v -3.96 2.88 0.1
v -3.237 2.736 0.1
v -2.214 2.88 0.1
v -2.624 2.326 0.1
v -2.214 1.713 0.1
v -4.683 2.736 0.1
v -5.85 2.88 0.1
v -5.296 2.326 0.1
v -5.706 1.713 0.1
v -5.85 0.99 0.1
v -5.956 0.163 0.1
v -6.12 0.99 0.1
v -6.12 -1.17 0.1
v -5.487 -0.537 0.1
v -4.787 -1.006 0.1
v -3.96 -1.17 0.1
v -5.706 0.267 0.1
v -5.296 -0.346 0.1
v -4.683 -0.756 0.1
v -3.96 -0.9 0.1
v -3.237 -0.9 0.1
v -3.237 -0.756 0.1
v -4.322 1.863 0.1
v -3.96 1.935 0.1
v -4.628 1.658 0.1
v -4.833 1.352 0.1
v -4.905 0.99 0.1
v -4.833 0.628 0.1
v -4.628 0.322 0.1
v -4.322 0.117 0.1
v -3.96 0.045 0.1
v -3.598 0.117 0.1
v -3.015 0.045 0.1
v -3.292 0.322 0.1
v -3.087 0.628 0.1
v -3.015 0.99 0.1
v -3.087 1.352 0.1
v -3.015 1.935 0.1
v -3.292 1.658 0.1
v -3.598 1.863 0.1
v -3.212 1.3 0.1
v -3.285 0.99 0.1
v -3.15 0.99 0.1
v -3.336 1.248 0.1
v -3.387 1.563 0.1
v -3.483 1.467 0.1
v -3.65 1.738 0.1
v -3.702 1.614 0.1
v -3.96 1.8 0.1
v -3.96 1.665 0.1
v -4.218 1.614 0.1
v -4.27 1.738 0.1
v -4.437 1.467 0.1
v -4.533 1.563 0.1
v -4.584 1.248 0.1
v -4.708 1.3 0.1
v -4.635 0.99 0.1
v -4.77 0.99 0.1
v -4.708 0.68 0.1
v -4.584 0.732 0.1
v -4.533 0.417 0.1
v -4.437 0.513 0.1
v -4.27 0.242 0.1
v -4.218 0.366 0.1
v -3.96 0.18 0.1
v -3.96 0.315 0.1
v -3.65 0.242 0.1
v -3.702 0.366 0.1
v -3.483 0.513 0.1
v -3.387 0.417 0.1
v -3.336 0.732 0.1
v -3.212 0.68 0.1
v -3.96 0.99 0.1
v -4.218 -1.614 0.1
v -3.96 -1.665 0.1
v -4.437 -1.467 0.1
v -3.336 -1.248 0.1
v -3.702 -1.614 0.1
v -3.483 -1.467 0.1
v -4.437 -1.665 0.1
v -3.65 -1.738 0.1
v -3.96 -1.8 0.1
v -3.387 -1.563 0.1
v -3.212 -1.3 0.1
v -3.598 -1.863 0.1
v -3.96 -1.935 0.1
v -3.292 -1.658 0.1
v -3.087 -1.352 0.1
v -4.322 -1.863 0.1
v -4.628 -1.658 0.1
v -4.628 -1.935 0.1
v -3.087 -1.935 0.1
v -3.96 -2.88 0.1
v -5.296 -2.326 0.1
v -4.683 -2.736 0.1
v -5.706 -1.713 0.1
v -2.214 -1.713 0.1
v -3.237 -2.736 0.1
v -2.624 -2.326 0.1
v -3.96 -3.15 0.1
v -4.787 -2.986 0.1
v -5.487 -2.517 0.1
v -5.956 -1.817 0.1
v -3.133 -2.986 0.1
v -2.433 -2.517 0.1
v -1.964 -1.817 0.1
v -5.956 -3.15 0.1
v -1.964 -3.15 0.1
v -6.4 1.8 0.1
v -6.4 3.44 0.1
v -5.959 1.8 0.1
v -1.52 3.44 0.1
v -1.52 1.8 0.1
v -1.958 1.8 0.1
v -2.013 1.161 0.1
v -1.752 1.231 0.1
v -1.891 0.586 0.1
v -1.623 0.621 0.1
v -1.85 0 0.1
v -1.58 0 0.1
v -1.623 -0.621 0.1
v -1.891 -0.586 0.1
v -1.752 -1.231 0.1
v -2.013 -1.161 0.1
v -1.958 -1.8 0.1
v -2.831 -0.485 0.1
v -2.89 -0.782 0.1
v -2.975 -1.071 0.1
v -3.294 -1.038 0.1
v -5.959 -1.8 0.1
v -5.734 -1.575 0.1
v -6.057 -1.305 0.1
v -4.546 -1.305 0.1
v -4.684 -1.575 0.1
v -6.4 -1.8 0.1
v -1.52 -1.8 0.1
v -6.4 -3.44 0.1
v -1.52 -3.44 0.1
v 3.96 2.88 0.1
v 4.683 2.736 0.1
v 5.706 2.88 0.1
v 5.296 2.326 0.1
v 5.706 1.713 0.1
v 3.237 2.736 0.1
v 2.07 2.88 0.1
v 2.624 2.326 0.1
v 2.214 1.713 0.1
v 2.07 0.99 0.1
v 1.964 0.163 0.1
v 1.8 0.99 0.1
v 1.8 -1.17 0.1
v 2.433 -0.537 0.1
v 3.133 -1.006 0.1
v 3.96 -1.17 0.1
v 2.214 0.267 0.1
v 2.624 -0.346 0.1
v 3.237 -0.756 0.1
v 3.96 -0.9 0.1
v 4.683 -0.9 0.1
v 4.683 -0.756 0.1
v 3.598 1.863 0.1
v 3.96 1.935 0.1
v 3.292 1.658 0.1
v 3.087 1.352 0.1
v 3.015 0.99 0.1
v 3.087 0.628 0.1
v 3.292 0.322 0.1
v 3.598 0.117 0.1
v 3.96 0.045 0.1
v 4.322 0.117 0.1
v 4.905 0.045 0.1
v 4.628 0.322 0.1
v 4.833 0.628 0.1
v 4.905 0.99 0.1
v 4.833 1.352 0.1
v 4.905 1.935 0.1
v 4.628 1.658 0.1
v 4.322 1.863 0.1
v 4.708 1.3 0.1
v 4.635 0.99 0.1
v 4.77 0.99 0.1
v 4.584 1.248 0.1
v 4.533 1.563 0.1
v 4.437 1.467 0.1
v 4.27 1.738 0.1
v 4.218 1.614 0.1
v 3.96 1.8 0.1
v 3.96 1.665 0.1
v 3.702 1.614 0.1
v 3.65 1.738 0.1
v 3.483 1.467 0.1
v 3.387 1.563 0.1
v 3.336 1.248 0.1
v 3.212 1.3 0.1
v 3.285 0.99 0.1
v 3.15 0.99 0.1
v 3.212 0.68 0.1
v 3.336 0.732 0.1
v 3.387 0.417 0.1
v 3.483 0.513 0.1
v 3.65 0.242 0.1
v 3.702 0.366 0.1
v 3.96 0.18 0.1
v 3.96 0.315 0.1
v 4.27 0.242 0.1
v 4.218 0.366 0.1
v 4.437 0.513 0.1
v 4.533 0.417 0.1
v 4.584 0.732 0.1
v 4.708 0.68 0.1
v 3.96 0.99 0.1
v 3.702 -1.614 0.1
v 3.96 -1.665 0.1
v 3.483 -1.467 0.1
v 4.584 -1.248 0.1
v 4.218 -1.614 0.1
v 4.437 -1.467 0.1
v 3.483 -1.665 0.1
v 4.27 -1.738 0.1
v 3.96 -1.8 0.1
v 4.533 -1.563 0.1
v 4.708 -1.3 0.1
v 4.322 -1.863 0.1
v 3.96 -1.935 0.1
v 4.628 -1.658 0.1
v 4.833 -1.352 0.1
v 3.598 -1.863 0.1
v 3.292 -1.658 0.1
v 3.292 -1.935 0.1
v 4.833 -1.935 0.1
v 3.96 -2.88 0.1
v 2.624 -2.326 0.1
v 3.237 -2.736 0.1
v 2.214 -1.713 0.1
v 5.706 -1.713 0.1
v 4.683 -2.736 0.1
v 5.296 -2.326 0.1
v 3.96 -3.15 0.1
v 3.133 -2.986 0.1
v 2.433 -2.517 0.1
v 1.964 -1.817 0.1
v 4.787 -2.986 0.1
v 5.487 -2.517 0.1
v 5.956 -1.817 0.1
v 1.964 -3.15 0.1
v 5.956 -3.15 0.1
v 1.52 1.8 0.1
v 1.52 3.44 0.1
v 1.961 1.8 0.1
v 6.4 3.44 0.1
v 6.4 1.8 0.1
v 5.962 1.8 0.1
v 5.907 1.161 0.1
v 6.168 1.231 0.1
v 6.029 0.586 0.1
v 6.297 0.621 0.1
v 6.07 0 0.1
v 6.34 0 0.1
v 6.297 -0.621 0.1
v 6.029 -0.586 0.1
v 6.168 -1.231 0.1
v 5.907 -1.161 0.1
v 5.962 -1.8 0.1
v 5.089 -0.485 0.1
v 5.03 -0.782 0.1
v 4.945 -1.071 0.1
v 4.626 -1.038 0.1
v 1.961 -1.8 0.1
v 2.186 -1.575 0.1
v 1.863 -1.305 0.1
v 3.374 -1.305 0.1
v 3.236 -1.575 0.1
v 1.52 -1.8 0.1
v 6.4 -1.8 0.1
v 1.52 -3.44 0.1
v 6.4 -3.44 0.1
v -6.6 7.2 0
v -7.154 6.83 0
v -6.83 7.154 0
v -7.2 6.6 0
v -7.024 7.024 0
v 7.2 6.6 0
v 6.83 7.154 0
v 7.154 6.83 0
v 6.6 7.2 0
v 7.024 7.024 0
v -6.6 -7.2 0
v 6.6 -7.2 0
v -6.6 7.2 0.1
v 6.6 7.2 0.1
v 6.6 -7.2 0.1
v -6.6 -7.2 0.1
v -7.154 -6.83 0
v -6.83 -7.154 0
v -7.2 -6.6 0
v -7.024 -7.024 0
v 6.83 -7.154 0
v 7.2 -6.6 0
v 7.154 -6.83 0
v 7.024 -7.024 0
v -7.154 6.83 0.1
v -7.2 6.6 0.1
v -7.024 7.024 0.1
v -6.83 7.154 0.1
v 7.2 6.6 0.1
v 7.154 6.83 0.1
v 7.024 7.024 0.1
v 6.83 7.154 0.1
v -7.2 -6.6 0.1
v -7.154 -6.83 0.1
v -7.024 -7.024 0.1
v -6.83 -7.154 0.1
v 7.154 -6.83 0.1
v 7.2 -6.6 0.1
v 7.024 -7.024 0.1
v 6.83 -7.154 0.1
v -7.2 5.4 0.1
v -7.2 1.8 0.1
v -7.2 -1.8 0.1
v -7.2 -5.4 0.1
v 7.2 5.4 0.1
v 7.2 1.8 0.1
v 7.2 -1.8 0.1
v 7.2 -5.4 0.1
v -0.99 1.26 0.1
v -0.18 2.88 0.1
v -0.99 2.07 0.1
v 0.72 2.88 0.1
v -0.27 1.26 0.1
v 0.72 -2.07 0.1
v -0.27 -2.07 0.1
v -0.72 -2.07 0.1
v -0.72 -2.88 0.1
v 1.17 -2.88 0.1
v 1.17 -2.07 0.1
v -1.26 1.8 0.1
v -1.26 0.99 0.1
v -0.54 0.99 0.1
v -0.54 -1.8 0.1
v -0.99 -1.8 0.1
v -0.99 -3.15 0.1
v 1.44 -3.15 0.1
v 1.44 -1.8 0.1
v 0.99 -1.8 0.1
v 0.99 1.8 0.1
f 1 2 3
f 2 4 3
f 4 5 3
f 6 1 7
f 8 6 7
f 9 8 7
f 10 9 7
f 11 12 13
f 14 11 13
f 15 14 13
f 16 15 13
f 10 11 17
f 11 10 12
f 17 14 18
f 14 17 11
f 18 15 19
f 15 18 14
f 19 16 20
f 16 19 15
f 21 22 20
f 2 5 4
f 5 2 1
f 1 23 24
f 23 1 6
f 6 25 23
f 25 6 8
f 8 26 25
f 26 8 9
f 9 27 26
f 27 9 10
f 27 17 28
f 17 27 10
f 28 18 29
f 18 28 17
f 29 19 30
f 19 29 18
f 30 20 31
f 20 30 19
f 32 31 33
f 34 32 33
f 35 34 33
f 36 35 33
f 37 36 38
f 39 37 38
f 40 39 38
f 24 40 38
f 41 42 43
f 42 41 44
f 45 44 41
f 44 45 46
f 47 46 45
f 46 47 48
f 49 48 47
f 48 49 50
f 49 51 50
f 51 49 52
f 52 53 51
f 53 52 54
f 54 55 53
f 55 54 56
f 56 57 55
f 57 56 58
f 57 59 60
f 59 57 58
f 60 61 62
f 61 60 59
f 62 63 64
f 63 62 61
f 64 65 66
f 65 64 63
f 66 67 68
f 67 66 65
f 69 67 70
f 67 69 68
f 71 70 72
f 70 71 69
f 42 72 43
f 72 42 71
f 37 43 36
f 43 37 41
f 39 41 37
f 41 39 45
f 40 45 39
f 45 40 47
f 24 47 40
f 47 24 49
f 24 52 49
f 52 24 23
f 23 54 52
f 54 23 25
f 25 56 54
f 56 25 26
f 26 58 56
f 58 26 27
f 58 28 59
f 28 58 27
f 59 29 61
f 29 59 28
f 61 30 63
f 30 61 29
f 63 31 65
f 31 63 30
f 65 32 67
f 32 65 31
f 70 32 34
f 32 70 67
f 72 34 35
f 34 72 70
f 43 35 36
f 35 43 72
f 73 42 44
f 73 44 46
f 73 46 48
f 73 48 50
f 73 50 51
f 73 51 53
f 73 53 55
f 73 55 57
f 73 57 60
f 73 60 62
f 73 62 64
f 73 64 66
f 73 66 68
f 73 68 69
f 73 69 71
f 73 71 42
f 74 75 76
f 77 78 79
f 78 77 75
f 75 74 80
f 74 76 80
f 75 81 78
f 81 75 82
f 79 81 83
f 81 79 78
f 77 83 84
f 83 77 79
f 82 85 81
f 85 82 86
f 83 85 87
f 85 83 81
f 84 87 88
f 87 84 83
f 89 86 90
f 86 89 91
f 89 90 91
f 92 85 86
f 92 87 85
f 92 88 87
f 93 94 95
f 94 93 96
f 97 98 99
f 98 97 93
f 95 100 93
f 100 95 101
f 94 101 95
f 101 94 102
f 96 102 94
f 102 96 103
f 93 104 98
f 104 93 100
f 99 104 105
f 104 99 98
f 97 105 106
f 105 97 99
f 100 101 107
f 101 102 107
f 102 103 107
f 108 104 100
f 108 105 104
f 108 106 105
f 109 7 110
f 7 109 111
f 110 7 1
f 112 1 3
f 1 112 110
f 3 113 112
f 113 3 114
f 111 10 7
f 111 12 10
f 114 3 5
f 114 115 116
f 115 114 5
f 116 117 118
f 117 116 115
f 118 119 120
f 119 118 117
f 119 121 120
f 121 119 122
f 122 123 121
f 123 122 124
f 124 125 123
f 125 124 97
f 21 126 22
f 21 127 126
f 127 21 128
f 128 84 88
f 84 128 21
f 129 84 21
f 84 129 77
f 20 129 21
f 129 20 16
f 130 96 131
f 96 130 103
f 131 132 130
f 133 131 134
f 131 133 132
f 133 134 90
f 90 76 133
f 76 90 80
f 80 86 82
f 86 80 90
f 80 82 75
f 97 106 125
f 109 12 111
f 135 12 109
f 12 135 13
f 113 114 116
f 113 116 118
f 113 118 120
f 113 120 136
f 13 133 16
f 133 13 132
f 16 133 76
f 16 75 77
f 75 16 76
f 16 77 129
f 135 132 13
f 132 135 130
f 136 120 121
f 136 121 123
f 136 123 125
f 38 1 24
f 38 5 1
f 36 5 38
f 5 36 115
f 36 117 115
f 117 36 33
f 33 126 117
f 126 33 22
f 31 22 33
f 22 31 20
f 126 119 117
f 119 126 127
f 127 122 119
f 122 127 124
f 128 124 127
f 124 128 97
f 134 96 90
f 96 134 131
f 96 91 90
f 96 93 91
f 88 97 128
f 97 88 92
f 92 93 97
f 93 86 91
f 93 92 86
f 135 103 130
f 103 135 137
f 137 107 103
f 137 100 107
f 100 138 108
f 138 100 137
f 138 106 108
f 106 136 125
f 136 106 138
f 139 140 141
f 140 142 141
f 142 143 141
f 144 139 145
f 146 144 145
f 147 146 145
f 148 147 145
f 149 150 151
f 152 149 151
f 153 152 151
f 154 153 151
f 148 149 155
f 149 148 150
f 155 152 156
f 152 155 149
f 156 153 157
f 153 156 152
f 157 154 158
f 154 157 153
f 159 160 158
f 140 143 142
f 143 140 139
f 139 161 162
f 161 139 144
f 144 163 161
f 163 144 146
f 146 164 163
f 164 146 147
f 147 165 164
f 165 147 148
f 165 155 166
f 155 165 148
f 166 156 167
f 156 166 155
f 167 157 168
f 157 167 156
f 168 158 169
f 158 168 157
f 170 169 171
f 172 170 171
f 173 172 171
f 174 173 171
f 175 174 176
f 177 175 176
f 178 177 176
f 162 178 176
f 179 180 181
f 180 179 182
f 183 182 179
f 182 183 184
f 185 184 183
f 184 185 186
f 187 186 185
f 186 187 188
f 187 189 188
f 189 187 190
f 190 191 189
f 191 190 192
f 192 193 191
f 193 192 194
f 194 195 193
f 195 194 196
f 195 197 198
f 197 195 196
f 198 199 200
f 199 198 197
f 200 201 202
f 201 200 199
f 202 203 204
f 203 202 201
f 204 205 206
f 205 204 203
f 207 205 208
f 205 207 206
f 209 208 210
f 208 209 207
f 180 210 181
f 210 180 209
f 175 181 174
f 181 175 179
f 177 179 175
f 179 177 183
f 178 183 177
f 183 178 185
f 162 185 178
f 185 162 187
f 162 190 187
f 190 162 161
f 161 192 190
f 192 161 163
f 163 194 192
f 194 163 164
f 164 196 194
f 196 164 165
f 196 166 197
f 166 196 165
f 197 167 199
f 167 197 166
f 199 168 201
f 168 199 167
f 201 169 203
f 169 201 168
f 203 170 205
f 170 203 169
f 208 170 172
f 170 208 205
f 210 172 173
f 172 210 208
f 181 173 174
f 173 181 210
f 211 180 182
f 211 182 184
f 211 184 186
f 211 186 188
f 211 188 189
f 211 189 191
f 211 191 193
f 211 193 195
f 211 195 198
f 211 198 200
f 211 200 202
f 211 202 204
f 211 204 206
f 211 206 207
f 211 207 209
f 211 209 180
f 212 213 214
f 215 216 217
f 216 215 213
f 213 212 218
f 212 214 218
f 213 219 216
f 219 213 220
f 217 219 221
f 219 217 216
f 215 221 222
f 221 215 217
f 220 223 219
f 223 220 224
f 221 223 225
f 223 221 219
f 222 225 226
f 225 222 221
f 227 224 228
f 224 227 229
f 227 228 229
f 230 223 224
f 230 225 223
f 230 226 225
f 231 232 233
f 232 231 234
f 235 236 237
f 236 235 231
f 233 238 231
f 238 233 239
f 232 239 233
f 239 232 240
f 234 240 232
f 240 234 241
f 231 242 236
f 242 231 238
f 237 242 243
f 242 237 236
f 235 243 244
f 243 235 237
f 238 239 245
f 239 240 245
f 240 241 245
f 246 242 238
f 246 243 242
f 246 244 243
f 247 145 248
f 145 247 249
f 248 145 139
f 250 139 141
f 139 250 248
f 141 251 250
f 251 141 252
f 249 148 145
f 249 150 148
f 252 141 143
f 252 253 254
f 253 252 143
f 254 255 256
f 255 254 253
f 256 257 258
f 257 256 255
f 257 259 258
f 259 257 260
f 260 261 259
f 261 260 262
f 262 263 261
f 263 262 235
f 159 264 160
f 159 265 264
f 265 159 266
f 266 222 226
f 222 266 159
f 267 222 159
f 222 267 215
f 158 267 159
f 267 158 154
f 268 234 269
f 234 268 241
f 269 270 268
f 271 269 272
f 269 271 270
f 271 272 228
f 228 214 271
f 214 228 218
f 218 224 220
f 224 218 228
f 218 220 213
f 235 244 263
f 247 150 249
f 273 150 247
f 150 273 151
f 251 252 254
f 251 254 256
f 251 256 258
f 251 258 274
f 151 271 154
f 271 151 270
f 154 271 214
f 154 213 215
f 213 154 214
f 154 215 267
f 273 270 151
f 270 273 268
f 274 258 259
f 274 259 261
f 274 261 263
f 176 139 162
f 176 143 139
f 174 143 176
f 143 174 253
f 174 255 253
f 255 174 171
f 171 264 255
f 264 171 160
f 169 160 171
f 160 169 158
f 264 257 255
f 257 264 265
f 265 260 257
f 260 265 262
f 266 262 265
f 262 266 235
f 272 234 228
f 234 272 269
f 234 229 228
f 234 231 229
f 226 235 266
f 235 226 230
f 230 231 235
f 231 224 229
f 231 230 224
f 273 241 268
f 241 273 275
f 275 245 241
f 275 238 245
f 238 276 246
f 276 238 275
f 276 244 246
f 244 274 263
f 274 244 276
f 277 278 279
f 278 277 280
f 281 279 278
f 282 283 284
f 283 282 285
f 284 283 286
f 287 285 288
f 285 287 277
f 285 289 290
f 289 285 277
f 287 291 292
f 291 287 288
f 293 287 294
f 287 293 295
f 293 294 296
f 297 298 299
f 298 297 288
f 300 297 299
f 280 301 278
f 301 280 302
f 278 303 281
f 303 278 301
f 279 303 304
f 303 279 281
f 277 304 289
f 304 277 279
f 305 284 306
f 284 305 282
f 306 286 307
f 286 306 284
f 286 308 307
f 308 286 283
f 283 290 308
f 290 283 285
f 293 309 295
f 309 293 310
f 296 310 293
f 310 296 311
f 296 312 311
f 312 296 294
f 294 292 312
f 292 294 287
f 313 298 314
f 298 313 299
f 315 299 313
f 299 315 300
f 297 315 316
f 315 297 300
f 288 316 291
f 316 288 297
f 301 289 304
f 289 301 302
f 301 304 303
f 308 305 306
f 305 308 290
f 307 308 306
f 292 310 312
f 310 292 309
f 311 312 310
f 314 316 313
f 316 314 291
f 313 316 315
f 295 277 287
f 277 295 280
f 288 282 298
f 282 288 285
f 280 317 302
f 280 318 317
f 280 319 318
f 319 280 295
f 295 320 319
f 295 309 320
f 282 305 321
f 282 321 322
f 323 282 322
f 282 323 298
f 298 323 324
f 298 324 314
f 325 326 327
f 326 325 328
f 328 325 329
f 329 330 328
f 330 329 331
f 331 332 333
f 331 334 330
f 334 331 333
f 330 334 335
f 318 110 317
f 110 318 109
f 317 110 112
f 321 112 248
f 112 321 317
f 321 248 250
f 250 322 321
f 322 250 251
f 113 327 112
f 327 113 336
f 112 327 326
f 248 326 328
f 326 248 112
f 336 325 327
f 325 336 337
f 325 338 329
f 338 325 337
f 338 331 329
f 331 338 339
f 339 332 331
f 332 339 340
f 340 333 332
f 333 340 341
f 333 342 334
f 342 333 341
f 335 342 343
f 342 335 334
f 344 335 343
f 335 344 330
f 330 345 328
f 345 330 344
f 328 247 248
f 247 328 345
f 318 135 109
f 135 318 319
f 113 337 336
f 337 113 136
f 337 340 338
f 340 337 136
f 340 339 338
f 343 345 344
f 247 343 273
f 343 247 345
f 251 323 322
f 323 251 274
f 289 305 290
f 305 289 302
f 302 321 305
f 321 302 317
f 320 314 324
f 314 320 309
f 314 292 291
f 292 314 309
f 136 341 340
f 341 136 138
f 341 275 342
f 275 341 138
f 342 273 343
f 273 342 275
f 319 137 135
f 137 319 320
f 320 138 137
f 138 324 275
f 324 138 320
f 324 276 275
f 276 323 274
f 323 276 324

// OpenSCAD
use <../lib.scad>
use <../p/1-4chrd.scad>
use <../p/1-4cyli.scad>
use <../p/box3u12.scad>
use <s/6148328ns01.scad>
function ldraw_lib__6148328n() = [
// 0 Sticker  1.8 x  1.8 with White "919" on German Flag on White Background
// 0 Name: 6148328n.dat
// 0 Author: Massimo Maso [Sirio]
// 0 !LDRAW_ORG Part UPDATE 2024-05
// 0 !LICENSE Licensed under CC BY 4.0 : see CAreadme.txt
// 
// 0 BFC CERTIFY CCW
  [0,"BFC","CERTIFY"],
  [0,"BFC","CCW"],
// 
// 0 !KEYWORDS 917K, Bricklink 75876stk01, Brickowl 852010, Hybrid, Pit Lane
// 0 !KEYWORDS Porsche, Rebrickable 26357, set 75876, Speed Champions
// 
// 0 !HISTORY 2024-06-30 [OrionP] Official Update 2024-05
// 
// 
// 0 // Subparts
// 
// 1 16 -9.9 -.25 0 1 0 0 0 1 0 0 0 1 s\6148328ns01.dat
  [1,16,-9.9,-.25,0,1,0,0,0,1,0,0,0,1, ldraw_lib__s__6148328ns01()],
// 1 16 9.9 -.25 0 1 0 0 0 1 0 0 0 1 s\6148328ns01.dat
  [1,16,9.9,-.25,0,1,0,0,0,1,0,0,0,1, ldraw_lib__s__6148328ns01()],
// 0 // Primitives
// 1 16 -16.5 0 16.5 -1.5 0 0 0 -1 0 0 0 1.5 1-4chrd.dat
  [1,16,-16.5,0,16.5,-1.5,0,0,0,-1,0,0,0,1.5, ldraw_lib__1_4chrd()],
// 1 16 16.5 0 16.5 1.5 0 0 0 -1 0 0 0 1.5 1-4chrd.dat
  [1,16,16.5,0,16.5,1.5,0,0,0,-1,0,0,0,1.5, ldraw_lib__1_4chrd()],
// 1 16 0 -.25 0 16.5 0 0 0 .25 0 0 0 18 box3u12.dat
  [1,16,0,-.25,0,16.5,0,0,0,.25,0,0,0,18, ldraw_lib__box3u12()],
// 1 16 -16.5 0 -16.5 -1.5 0 0 0 -1 0 0 0 -1.5 1-4chrd.dat
  [1,16,-16.5,0,-16.5,-1.5,0,0,0,-1,0,0,0,-1.5, ldraw_lib__1_4chrd()],
// 1 16 16.5 0 -16.5 1.5 0 0 0 -1 0 0 0 -1.5 1-4chrd.dat
  [1,16,16.5,0,-16.5,1.5,0,0,0,-1,0,0,0,-1.5, ldraw_lib__1_4chrd()],
// 1 16 -16.5 0 16.5 -1.5 0 0 0 -.25 0 0 0 1.5 1-4cyli.dat
  [1,16,-16.5,0,16.5,-1.5,0,0,0,-.25,0,0,0,1.5, ldraw_lib__1_4cyli()],
// 1 16 16.5 0 16.5 1.5 0 0 0 -.25 0 0 0 1.5 1-4cyli.dat
  [1,16,16.5,0,16.5,1.5,0,0,0,-.25,0,0,0,1.5, ldraw_lib__1_4cyli()],
// 1 16 -16.5 0 -16.5 -1.5 0 0 0 -.25 0 0 0 -1.5 1-4cyli.dat
  [1,16,-16.5,0,-16.5,-1.5,0,0,0,-.25,0,0,0,-1.5, ldraw_lib__1_4cyli()],
// 1 16 16.5 0 -16.5 1.5 0 0 0 -.25 0 0 0 -1.5 1-4cyli.dat
  [1,16,16.5,0,-16.5,1.5,0,0,0,-.25,0,0,0,-1.5, ldraw_lib__1_4cyli()],
// 1 15 -16.5 -.25 16.5 -1.5 0 0 0 1 0 0 0 1.5 1-4chrd.dat
  [1,15,-16.5,-.25,16.5,-1.5,0,0,0,1,0,0,0,1.5, ldraw_lib__1_4chrd()],
// 1 15 16.5 -.25 16.5 1.5 0 0 0 1 0 0 0 1.5 1-4chrd.dat
  [1,15,16.5,-.25,16.5,1.5,0,0,0,1,0,0,0,1.5, ldraw_lib__1_4chrd()],
// 1 15 -16.5 -.25 -16.5 -1.5 0 0 0 1 0 0 0 -1.5 1-4chrd.dat
  [1,15,-16.5,-.25,-16.5,-1.5,0,0,0,1,0,0,0,-1.5, ldraw_lib__1_4chrd()],
// 1 15 16.5 -.25 -16.5 1.5 0 0 0 1 0 0 0 -1.5 1-4chrd.dat
  [1,15,16.5,-.25,-16.5,1.5,0,0,0,1,0,0,0,-1.5, ldraw_lib__1_4chrd()],
// 0 // Bottom faces
// 4 16 -16.5 0 18 -16.5 0 -18 -18 0 -16.5 -18 0 16.5
  [4,16,-16.5,0,18,-16.5,0,-18,-18,0,-16.5,-18,0,16.5],
// 4 16 16.5 0 18 18 0 16.5 18 0 -16.5 16.5 0 -18
  [4,16,16.5,0,18,18,0,16.5,18,0,-16.5,16.5,0,-18],
// 0 // Lateral faces
// 3 16 -18 0 16.5 -18 -.25 13.5 -18 -.25 16.5
  [3,16,-18,0,16.5,-18,-.25,13.5,-18,-.25,16.5],
// 3 16 -18 0 16.5 -18 -.25 4.5 -18 -.25 13.5
  [3,16,-18,0,16.5,-18,-.25,4.5,-18,-.25,13.5],
// 4 16 -18 0 16.5 -18 0 -16.5 -18 -.25 -4.5 -18 -.25 4.5
  [4,16,-18,0,16.5,-18,0,-16.5,-18,-.25,-4.5,-18,-.25,4.5],
// 3 16 -18 0 -16.5 -18 -.25 -13.5 -18 -.25 -4.5
  [3,16,-18,0,-16.5,-18,-.25,-13.5,-18,-.25,-4.5],
// 3 16 -18 0 -16.5 -18 -.25 -16.5 -18 -.25 -13.5
  [3,16,-18,0,-16.5,-18,-.25,-16.5,-18,-.25,-13.5],
// 3 16 18 0 16.5 18 -.25 16.5 18 -.25 13.5
  [3,16,18,0,16.5,18,-.25,16.5,18,-.25,13.5],
// 3 16 18 0 16.5 18 -.25 13.5 18 -.25 4.5
  [3,16,18,0,16.5,18,-.25,13.5,18,-.25,4.5],
// 4 16 18 0 16.5 18 -.25 4.5 18 -.25 -4.5 18 0 -16.5
  [4,16,18,0,16.5,18,-.25,4.5,18,-.25,-4.5,18,0,-16.5],
// 3 16 18 0 -16.5 18 -.25 -4.5 18 -.25 -13.5
  [3,16,18,0,-16.5,18,-.25,-4.5,18,-.25,-13.5],
// 3 16 18 0 -16.5 18 -.25 -13.5 18 -.25 -16.5
  [3,16,18,0,-16.5,18,-.25,-13.5,18,-.25,-16.5],
// 0 // Top faces
// 0 // Inner of number "1"
// 4 15 1.8 -.25 7.2 -.45 -.25 7.2 -2.475 -.25 5.175 -2.475 -.25 3.15
  [4,15,1.8,-.25,7.2,-.45,-.25,7.2,-2.475,-.25,5.175,-2.475,-.25,3.15],
// 3 15 1.8 -.25 7.2 -2.475 -.25 3.15 -.675 -.25 3.15
  [3,15,1.8,-.25,7.2,-2.475,-.25,3.15,-.675,-.25,3.15],
// 4 15 1.8 -.25 7.2 -.675 -.25 3.15 -.675 -.25 -5.175 1.8 -.25 -5.175
  [4,15,1.8,-.25,7.2,-.675,-.25,3.15,-.675,-.25,-5.175,1.8,-.25,-5.175],
// 3 15 -.675 -.25 -5.175 -1.8 -.25 -5.175 -1.8 -.25 -7.2
  [3,15,-.675,-.25,-5.175,-1.8,-.25,-5.175,-1.8,-.25,-7.2],
// 4 15 -.675 -.25 -5.175 -1.8 -.25 -7.2 2.925 -.25 -7.2 1.8 -.25 -5.175
  [4,15,-.675,-.25,-5.175,-1.8,-.25,-7.2,2.925,-.25,-7.2,1.8,-.25,-5.175],
// 3 15 1.8 -.25 -5.175 2.925 -.25 -7.2 2.925 -.25 -5.175
  [3,15,1.8,-.25,-5.175,2.925,-.25,-7.2,2.925,-.25,-5.175],
// 0 // Black faces
// 4 0 -18 -.25 13.5 -18 -.25 4.5 -16 -.25 4.5 -16 -.25 8.6
  [4,0,-18,-.25,13.5,-18,-.25,4.5,-16,-.25,4.5,-16,-.25,8.6],
// 3 0 -18 -.25 13.5 -16 -.25 8.6 -3.8 -.25 8.6
  [3,0,-18,-.25,13.5,-16,-.25,8.6,-3.8,-.25,8.6],
// 4 0 -18 -.25 13.5 -3.8 -.25 8.6 3.8 -.25 8.6 18 -.25 13.5
  [4,0,-18,-.25,13.5,-3.8,-.25,8.6,3.8,-.25,8.6,18,-.25,13.5],
// 3 0 18 -.25 13.5 3.8 -.25 8.6 16 -.25 8.6
  [3,0,18,-.25,13.5,3.8,-.25,8.6,16,-.25,8.6],
// 4 0 18 -.25 13.5 16 -.25 8.6 16 -.25 4.5 18 -.25 4.5
  [4,0,18,-.25,13.5,16,-.25,8.6,16,-.25,4.5,18,-.25,4.5],
// 4 0 -3.8 -.25 8.6 -3.8 -.25 4.5 -3.15 -.25 4.5 -2.475 -.25 5.175
  [4,0,-3.8,-.25,8.6,-3.8,-.25,4.5,-3.15,-.25,4.5,-2.475,-.25,5.175],
// 3 0 -3.8 -.25 8.6 -2.475 -.25 5.175 -.45 -.25 7.2
  [3,0,-3.8,-.25,8.6,-2.475,-.25,5.175,-.45,-.25,7.2],
// 4 0 -3.8 -.25 8.6 -.45 -.25 7.2 1.8 -.25 7.2 3.8 -.25 8.6
  [4,0,-3.8,-.25,8.6,-.45,-.25,7.2,1.8,-.25,7.2,3.8,-.25,8.6],
// 4 0 -3.15 -.25 2.475 -2.475 -.25 3.15 -2.475 -.25 5.175 -3.15 -.25 4.5
  [4,0,-3.15,-.25,2.475,-2.475,-.25,3.15,-2.475,-.25,5.175,-3.15,-.25,4.5],
// 4 0 -3.15 -.25 2.475 -1.35 -.25 2.475 -.675 -.25 3.15 -2.475 -.25 3.15
  [4,0,-3.15,-.25,2.475,-1.35,-.25,2.475,-.675,-.25,3.15,-2.475,-.25,3.15],
// 4 0 -1.35 -.25 -4.5 -.675 -.25 -5.175 -.675 -.25 3.15 -1.35 -.25 2.475
  [4,0,-1.35,-.25,-4.5,-.675,-.25,-5.175,-.675,-.25,3.15,-1.35,-.25,2.475],
// 4 0 -1.35 -.25 -4.5 -2.475 -.25 -4.5 -1.8 -.25 -5.175 -.675 -.25 -5.175
  [4,0,-1.35,-.25,-4.5,-2.475,-.25,-4.5,-1.8,-.25,-5.175,-.675,-.25,-5.175],
// 4 0 -2.475 -.25 -7.875 -1.8 -.25 -7.2 -1.8 -.25 -5.175 -2.475 -.25 -4.5
  [4,0,-2.475,-.25,-7.875,-1.8,-.25,-7.2,-1.8,-.25,-5.175,-2.475,-.25,-4.5],
// 4 0 -2.475 -.25 -7.875 3.6 -.25 -7.875 2.925 -.25 -7.2 -1.8 -.25 -7.2
  [4,0,-2.475,-.25,-7.875,3.6,-.25,-7.875,2.925,-.25,-7.2,-1.8,-.25,-7.2],
// 4 0 3.6 -.25 -4.5 2.925 -.25 -5.175 2.925 -.25 -7.2 3.6 -.25 -7.875
  [4,0,3.6,-.25,-4.5,2.925,-.25,-5.175,2.925,-.25,-7.2,3.6,-.25,-7.875],
// 4 0 3.6 -.25 -4.5 2.475 -.25 -4.5 1.8 -.25 -5.175 2.925 -.25 -5.175
  [4,0,3.6,-.25,-4.5,2.475,-.25,-4.5,1.8,-.25,-5.175,2.925,-.25,-5.175],
// 4 0 2.475 -.25 4.5 1.8 -.25 7.2 1.8 -.25 -5.175 2.475 -.25 -4.5
  [4,0,2.475,-.25,4.5,1.8,-.25,7.2,1.8,-.25,-5.175,2.475,-.25,-4.5],
// 4 0 2.475 -.25 4.5 3.8 -.25 4.5 3.8 -.25 8.6 1.8 -.25 7.2
  [4,0,2.475,-.25,4.5,3.8,-.25,4.5,3.8,-.25,8.6,1.8,-.25,7.2],
// 0 // Red faces
// 4 4 -18 -.25 -4.5 -16 -.25 -4.5 -16 -.25 4.5 -18 -.25 4.5
  [4,4,-18,-.25,-4.5,-16,-.25,-4.5,-16,-.25,4.5,-18,-.25,4.5],
// 4 4 -3.8 -.25 -4.5 -3.15 -.25 2.475 -3.15 -.25 4.5 -3.8 -.25 4.5
  [4,4,-3.8,-.25,-4.5,-3.15,-.25,2.475,-3.15,-.25,4.5,-3.8,-.25,4.5],
// 4 4 -3.8 -.25 -4.5 -2.475 -.25 -4.5 -1.35 -.25 2.475 -3.15 -.25 2.475
  [4,4,-3.8,-.25,-4.5,-2.475,-.25,-4.5,-1.35,-.25,2.475,-3.15,-.25,2.475],
// 3 4 -2.475 -.25 -4.5 -1.35 -.25 -4.5 -1.35 -.25 2.475
  [3,4,-2.475,-.25,-4.5,-1.35,-.25,-4.5,-1.35,-.25,2.475],
// 3 4 3.6 -.25 -4.5 2.475 -.25 4.5 2.475 -.25 -4.5
  [3,4,3.6,-.25,-4.5,2.475,-.25,4.5,2.475,-.25,-4.5],
// 4 4 3.6 -.25 -4.5 3.8 -.25 -4.5 3.8 -.25 4.5 2.475 -.25 4.5
  [4,4,3.6,-.25,-4.5,3.8,-.25,-4.5,3.8,-.25,4.5,2.475,-.25,4.5],
// 4 4 18 -.25 -4.5 18 -.25 4.5 16 -.25 4.5 16 -.25 -4.5
  [4,4,18,-.25,-4.5,18,-.25,4.5,16,-.25,4.5,16,-.25,-4.5],
// 0 // White faces
// 4 15 -18 -.25 16.5 18 -.25 16.5 16.5 -.25 18 -16.5 -.25 18
  [4,15,-18,-.25,16.5,18,-.25,16.5,16.5,-.25,18,-16.5,-.25,18],
// 4 15 -18 -.25 16.5 -18 -.25 13.5 18 -.25 13.5 18 -.25 16.5
  [4,15,-18,-.25,16.5,-18,-.25,13.5,18,-.25,13.5,18,-.25,16.5],
// 4 15 -18 -.25 -16.5 18 -.25 -16.5 18 -.25 -13.5 -18 -.25 -13.5
  [4,15,-18,-.25,-16.5,18,-.25,-16.5,18,-.25,-13.5,-18,-.25,-13.5],
// 4 15 -18 -.25 -16.5 -16.5 -.25 -18 16.5 -.25 -18 18 -.25 -16.5
  [4,15,-18,-.25,-16.5,-16.5,-.25,-18,16.5,-.25,-18,18,-.25,-16.5],
// 0 // Yellow faces
// 4 14 -3.8 -.25 -8.6 -2.475 -.25 -7.875 -2.475 -.25 -4.5 -3.8 -.25 -4.5
  [4,14,-3.8,-.25,-8.6,-2.475,-.25,-7.875,-2.475,-.25,-4.5,-3.8,-.25,-4.5],
// 4 14 -3.8 -.25 -8.6 3.8 -.25 -8.6 3.6 -.25 -7.875 -2.475 -.25 -7.875
  [4,14,-3.8,-.25,-8.6,3.8,-.25,-8.6,3.6,-.25,-7.875,-2.475,-.25,-7.875],
// 4 14 3.8 -.25 -8.6 3.8 -.25 -4.5 3.6 -.25 -4.5 3.6 -.25 -7.875
  [4,14,3.8,-.25,-8.6,3.8,-.25,-4.5,3.6,-.25,-4.5,3.6,-.25,-7.875],
// 4 14 -18 -.25 -13.5 -16 -.25 -8.6 -16 -.25 -4.5 -18 -.25 -4.5
  [4,14,-18,-.25,-13.5,-16,-.25,-8.6,-16,-.25,-4.5,-18,-.25,-4.5],
// 3 14 -18 -.25 -13.5 -3.8 -.25 -8.6 -16 -.25 -8.6
  [3,14,-18,-.25,-13.5,-3.8,-.25,-8.6,-16,-.25,-8.6],
// 4 14 -18 -.25 -13.5 18 -.25 -13.5 3.8 -.25 -8.6 -3.8 -.25 -8.6
  [4,14,-18,-.25,-13.5,18,-.25,-13.5,3.8,-.25,-8.6,-3.8,-.25,-8.6],
// 3 14 18 -.25 -13.5 16 -.25 -8.6 3.8 -.25 -8.6
  [3,14,18,-.25,-13.5,16,-.25,-8.6,3.8,-.25,-8.6],
// 4 14 18 -.25 -13.5 18 -.25 -4.5 16 -.25 -4.5 16 -.25 -8.6
  [4,14,18,-.25,-13.5,18,-.25,-4.5,16,-.25,-4.5,16,-.25,-8.6],
];
module ldraw_lib__6148328n(step=0, col=false, unit=2/5, alt=false, line=0.2, solid=!$preview)
    makepoly(ldraw_lib__6148328n(), step=step, col=col, unit=unit, alt=alt, line=line, solid=solid);
ldraw_lib__6148328n(line=0.2);
